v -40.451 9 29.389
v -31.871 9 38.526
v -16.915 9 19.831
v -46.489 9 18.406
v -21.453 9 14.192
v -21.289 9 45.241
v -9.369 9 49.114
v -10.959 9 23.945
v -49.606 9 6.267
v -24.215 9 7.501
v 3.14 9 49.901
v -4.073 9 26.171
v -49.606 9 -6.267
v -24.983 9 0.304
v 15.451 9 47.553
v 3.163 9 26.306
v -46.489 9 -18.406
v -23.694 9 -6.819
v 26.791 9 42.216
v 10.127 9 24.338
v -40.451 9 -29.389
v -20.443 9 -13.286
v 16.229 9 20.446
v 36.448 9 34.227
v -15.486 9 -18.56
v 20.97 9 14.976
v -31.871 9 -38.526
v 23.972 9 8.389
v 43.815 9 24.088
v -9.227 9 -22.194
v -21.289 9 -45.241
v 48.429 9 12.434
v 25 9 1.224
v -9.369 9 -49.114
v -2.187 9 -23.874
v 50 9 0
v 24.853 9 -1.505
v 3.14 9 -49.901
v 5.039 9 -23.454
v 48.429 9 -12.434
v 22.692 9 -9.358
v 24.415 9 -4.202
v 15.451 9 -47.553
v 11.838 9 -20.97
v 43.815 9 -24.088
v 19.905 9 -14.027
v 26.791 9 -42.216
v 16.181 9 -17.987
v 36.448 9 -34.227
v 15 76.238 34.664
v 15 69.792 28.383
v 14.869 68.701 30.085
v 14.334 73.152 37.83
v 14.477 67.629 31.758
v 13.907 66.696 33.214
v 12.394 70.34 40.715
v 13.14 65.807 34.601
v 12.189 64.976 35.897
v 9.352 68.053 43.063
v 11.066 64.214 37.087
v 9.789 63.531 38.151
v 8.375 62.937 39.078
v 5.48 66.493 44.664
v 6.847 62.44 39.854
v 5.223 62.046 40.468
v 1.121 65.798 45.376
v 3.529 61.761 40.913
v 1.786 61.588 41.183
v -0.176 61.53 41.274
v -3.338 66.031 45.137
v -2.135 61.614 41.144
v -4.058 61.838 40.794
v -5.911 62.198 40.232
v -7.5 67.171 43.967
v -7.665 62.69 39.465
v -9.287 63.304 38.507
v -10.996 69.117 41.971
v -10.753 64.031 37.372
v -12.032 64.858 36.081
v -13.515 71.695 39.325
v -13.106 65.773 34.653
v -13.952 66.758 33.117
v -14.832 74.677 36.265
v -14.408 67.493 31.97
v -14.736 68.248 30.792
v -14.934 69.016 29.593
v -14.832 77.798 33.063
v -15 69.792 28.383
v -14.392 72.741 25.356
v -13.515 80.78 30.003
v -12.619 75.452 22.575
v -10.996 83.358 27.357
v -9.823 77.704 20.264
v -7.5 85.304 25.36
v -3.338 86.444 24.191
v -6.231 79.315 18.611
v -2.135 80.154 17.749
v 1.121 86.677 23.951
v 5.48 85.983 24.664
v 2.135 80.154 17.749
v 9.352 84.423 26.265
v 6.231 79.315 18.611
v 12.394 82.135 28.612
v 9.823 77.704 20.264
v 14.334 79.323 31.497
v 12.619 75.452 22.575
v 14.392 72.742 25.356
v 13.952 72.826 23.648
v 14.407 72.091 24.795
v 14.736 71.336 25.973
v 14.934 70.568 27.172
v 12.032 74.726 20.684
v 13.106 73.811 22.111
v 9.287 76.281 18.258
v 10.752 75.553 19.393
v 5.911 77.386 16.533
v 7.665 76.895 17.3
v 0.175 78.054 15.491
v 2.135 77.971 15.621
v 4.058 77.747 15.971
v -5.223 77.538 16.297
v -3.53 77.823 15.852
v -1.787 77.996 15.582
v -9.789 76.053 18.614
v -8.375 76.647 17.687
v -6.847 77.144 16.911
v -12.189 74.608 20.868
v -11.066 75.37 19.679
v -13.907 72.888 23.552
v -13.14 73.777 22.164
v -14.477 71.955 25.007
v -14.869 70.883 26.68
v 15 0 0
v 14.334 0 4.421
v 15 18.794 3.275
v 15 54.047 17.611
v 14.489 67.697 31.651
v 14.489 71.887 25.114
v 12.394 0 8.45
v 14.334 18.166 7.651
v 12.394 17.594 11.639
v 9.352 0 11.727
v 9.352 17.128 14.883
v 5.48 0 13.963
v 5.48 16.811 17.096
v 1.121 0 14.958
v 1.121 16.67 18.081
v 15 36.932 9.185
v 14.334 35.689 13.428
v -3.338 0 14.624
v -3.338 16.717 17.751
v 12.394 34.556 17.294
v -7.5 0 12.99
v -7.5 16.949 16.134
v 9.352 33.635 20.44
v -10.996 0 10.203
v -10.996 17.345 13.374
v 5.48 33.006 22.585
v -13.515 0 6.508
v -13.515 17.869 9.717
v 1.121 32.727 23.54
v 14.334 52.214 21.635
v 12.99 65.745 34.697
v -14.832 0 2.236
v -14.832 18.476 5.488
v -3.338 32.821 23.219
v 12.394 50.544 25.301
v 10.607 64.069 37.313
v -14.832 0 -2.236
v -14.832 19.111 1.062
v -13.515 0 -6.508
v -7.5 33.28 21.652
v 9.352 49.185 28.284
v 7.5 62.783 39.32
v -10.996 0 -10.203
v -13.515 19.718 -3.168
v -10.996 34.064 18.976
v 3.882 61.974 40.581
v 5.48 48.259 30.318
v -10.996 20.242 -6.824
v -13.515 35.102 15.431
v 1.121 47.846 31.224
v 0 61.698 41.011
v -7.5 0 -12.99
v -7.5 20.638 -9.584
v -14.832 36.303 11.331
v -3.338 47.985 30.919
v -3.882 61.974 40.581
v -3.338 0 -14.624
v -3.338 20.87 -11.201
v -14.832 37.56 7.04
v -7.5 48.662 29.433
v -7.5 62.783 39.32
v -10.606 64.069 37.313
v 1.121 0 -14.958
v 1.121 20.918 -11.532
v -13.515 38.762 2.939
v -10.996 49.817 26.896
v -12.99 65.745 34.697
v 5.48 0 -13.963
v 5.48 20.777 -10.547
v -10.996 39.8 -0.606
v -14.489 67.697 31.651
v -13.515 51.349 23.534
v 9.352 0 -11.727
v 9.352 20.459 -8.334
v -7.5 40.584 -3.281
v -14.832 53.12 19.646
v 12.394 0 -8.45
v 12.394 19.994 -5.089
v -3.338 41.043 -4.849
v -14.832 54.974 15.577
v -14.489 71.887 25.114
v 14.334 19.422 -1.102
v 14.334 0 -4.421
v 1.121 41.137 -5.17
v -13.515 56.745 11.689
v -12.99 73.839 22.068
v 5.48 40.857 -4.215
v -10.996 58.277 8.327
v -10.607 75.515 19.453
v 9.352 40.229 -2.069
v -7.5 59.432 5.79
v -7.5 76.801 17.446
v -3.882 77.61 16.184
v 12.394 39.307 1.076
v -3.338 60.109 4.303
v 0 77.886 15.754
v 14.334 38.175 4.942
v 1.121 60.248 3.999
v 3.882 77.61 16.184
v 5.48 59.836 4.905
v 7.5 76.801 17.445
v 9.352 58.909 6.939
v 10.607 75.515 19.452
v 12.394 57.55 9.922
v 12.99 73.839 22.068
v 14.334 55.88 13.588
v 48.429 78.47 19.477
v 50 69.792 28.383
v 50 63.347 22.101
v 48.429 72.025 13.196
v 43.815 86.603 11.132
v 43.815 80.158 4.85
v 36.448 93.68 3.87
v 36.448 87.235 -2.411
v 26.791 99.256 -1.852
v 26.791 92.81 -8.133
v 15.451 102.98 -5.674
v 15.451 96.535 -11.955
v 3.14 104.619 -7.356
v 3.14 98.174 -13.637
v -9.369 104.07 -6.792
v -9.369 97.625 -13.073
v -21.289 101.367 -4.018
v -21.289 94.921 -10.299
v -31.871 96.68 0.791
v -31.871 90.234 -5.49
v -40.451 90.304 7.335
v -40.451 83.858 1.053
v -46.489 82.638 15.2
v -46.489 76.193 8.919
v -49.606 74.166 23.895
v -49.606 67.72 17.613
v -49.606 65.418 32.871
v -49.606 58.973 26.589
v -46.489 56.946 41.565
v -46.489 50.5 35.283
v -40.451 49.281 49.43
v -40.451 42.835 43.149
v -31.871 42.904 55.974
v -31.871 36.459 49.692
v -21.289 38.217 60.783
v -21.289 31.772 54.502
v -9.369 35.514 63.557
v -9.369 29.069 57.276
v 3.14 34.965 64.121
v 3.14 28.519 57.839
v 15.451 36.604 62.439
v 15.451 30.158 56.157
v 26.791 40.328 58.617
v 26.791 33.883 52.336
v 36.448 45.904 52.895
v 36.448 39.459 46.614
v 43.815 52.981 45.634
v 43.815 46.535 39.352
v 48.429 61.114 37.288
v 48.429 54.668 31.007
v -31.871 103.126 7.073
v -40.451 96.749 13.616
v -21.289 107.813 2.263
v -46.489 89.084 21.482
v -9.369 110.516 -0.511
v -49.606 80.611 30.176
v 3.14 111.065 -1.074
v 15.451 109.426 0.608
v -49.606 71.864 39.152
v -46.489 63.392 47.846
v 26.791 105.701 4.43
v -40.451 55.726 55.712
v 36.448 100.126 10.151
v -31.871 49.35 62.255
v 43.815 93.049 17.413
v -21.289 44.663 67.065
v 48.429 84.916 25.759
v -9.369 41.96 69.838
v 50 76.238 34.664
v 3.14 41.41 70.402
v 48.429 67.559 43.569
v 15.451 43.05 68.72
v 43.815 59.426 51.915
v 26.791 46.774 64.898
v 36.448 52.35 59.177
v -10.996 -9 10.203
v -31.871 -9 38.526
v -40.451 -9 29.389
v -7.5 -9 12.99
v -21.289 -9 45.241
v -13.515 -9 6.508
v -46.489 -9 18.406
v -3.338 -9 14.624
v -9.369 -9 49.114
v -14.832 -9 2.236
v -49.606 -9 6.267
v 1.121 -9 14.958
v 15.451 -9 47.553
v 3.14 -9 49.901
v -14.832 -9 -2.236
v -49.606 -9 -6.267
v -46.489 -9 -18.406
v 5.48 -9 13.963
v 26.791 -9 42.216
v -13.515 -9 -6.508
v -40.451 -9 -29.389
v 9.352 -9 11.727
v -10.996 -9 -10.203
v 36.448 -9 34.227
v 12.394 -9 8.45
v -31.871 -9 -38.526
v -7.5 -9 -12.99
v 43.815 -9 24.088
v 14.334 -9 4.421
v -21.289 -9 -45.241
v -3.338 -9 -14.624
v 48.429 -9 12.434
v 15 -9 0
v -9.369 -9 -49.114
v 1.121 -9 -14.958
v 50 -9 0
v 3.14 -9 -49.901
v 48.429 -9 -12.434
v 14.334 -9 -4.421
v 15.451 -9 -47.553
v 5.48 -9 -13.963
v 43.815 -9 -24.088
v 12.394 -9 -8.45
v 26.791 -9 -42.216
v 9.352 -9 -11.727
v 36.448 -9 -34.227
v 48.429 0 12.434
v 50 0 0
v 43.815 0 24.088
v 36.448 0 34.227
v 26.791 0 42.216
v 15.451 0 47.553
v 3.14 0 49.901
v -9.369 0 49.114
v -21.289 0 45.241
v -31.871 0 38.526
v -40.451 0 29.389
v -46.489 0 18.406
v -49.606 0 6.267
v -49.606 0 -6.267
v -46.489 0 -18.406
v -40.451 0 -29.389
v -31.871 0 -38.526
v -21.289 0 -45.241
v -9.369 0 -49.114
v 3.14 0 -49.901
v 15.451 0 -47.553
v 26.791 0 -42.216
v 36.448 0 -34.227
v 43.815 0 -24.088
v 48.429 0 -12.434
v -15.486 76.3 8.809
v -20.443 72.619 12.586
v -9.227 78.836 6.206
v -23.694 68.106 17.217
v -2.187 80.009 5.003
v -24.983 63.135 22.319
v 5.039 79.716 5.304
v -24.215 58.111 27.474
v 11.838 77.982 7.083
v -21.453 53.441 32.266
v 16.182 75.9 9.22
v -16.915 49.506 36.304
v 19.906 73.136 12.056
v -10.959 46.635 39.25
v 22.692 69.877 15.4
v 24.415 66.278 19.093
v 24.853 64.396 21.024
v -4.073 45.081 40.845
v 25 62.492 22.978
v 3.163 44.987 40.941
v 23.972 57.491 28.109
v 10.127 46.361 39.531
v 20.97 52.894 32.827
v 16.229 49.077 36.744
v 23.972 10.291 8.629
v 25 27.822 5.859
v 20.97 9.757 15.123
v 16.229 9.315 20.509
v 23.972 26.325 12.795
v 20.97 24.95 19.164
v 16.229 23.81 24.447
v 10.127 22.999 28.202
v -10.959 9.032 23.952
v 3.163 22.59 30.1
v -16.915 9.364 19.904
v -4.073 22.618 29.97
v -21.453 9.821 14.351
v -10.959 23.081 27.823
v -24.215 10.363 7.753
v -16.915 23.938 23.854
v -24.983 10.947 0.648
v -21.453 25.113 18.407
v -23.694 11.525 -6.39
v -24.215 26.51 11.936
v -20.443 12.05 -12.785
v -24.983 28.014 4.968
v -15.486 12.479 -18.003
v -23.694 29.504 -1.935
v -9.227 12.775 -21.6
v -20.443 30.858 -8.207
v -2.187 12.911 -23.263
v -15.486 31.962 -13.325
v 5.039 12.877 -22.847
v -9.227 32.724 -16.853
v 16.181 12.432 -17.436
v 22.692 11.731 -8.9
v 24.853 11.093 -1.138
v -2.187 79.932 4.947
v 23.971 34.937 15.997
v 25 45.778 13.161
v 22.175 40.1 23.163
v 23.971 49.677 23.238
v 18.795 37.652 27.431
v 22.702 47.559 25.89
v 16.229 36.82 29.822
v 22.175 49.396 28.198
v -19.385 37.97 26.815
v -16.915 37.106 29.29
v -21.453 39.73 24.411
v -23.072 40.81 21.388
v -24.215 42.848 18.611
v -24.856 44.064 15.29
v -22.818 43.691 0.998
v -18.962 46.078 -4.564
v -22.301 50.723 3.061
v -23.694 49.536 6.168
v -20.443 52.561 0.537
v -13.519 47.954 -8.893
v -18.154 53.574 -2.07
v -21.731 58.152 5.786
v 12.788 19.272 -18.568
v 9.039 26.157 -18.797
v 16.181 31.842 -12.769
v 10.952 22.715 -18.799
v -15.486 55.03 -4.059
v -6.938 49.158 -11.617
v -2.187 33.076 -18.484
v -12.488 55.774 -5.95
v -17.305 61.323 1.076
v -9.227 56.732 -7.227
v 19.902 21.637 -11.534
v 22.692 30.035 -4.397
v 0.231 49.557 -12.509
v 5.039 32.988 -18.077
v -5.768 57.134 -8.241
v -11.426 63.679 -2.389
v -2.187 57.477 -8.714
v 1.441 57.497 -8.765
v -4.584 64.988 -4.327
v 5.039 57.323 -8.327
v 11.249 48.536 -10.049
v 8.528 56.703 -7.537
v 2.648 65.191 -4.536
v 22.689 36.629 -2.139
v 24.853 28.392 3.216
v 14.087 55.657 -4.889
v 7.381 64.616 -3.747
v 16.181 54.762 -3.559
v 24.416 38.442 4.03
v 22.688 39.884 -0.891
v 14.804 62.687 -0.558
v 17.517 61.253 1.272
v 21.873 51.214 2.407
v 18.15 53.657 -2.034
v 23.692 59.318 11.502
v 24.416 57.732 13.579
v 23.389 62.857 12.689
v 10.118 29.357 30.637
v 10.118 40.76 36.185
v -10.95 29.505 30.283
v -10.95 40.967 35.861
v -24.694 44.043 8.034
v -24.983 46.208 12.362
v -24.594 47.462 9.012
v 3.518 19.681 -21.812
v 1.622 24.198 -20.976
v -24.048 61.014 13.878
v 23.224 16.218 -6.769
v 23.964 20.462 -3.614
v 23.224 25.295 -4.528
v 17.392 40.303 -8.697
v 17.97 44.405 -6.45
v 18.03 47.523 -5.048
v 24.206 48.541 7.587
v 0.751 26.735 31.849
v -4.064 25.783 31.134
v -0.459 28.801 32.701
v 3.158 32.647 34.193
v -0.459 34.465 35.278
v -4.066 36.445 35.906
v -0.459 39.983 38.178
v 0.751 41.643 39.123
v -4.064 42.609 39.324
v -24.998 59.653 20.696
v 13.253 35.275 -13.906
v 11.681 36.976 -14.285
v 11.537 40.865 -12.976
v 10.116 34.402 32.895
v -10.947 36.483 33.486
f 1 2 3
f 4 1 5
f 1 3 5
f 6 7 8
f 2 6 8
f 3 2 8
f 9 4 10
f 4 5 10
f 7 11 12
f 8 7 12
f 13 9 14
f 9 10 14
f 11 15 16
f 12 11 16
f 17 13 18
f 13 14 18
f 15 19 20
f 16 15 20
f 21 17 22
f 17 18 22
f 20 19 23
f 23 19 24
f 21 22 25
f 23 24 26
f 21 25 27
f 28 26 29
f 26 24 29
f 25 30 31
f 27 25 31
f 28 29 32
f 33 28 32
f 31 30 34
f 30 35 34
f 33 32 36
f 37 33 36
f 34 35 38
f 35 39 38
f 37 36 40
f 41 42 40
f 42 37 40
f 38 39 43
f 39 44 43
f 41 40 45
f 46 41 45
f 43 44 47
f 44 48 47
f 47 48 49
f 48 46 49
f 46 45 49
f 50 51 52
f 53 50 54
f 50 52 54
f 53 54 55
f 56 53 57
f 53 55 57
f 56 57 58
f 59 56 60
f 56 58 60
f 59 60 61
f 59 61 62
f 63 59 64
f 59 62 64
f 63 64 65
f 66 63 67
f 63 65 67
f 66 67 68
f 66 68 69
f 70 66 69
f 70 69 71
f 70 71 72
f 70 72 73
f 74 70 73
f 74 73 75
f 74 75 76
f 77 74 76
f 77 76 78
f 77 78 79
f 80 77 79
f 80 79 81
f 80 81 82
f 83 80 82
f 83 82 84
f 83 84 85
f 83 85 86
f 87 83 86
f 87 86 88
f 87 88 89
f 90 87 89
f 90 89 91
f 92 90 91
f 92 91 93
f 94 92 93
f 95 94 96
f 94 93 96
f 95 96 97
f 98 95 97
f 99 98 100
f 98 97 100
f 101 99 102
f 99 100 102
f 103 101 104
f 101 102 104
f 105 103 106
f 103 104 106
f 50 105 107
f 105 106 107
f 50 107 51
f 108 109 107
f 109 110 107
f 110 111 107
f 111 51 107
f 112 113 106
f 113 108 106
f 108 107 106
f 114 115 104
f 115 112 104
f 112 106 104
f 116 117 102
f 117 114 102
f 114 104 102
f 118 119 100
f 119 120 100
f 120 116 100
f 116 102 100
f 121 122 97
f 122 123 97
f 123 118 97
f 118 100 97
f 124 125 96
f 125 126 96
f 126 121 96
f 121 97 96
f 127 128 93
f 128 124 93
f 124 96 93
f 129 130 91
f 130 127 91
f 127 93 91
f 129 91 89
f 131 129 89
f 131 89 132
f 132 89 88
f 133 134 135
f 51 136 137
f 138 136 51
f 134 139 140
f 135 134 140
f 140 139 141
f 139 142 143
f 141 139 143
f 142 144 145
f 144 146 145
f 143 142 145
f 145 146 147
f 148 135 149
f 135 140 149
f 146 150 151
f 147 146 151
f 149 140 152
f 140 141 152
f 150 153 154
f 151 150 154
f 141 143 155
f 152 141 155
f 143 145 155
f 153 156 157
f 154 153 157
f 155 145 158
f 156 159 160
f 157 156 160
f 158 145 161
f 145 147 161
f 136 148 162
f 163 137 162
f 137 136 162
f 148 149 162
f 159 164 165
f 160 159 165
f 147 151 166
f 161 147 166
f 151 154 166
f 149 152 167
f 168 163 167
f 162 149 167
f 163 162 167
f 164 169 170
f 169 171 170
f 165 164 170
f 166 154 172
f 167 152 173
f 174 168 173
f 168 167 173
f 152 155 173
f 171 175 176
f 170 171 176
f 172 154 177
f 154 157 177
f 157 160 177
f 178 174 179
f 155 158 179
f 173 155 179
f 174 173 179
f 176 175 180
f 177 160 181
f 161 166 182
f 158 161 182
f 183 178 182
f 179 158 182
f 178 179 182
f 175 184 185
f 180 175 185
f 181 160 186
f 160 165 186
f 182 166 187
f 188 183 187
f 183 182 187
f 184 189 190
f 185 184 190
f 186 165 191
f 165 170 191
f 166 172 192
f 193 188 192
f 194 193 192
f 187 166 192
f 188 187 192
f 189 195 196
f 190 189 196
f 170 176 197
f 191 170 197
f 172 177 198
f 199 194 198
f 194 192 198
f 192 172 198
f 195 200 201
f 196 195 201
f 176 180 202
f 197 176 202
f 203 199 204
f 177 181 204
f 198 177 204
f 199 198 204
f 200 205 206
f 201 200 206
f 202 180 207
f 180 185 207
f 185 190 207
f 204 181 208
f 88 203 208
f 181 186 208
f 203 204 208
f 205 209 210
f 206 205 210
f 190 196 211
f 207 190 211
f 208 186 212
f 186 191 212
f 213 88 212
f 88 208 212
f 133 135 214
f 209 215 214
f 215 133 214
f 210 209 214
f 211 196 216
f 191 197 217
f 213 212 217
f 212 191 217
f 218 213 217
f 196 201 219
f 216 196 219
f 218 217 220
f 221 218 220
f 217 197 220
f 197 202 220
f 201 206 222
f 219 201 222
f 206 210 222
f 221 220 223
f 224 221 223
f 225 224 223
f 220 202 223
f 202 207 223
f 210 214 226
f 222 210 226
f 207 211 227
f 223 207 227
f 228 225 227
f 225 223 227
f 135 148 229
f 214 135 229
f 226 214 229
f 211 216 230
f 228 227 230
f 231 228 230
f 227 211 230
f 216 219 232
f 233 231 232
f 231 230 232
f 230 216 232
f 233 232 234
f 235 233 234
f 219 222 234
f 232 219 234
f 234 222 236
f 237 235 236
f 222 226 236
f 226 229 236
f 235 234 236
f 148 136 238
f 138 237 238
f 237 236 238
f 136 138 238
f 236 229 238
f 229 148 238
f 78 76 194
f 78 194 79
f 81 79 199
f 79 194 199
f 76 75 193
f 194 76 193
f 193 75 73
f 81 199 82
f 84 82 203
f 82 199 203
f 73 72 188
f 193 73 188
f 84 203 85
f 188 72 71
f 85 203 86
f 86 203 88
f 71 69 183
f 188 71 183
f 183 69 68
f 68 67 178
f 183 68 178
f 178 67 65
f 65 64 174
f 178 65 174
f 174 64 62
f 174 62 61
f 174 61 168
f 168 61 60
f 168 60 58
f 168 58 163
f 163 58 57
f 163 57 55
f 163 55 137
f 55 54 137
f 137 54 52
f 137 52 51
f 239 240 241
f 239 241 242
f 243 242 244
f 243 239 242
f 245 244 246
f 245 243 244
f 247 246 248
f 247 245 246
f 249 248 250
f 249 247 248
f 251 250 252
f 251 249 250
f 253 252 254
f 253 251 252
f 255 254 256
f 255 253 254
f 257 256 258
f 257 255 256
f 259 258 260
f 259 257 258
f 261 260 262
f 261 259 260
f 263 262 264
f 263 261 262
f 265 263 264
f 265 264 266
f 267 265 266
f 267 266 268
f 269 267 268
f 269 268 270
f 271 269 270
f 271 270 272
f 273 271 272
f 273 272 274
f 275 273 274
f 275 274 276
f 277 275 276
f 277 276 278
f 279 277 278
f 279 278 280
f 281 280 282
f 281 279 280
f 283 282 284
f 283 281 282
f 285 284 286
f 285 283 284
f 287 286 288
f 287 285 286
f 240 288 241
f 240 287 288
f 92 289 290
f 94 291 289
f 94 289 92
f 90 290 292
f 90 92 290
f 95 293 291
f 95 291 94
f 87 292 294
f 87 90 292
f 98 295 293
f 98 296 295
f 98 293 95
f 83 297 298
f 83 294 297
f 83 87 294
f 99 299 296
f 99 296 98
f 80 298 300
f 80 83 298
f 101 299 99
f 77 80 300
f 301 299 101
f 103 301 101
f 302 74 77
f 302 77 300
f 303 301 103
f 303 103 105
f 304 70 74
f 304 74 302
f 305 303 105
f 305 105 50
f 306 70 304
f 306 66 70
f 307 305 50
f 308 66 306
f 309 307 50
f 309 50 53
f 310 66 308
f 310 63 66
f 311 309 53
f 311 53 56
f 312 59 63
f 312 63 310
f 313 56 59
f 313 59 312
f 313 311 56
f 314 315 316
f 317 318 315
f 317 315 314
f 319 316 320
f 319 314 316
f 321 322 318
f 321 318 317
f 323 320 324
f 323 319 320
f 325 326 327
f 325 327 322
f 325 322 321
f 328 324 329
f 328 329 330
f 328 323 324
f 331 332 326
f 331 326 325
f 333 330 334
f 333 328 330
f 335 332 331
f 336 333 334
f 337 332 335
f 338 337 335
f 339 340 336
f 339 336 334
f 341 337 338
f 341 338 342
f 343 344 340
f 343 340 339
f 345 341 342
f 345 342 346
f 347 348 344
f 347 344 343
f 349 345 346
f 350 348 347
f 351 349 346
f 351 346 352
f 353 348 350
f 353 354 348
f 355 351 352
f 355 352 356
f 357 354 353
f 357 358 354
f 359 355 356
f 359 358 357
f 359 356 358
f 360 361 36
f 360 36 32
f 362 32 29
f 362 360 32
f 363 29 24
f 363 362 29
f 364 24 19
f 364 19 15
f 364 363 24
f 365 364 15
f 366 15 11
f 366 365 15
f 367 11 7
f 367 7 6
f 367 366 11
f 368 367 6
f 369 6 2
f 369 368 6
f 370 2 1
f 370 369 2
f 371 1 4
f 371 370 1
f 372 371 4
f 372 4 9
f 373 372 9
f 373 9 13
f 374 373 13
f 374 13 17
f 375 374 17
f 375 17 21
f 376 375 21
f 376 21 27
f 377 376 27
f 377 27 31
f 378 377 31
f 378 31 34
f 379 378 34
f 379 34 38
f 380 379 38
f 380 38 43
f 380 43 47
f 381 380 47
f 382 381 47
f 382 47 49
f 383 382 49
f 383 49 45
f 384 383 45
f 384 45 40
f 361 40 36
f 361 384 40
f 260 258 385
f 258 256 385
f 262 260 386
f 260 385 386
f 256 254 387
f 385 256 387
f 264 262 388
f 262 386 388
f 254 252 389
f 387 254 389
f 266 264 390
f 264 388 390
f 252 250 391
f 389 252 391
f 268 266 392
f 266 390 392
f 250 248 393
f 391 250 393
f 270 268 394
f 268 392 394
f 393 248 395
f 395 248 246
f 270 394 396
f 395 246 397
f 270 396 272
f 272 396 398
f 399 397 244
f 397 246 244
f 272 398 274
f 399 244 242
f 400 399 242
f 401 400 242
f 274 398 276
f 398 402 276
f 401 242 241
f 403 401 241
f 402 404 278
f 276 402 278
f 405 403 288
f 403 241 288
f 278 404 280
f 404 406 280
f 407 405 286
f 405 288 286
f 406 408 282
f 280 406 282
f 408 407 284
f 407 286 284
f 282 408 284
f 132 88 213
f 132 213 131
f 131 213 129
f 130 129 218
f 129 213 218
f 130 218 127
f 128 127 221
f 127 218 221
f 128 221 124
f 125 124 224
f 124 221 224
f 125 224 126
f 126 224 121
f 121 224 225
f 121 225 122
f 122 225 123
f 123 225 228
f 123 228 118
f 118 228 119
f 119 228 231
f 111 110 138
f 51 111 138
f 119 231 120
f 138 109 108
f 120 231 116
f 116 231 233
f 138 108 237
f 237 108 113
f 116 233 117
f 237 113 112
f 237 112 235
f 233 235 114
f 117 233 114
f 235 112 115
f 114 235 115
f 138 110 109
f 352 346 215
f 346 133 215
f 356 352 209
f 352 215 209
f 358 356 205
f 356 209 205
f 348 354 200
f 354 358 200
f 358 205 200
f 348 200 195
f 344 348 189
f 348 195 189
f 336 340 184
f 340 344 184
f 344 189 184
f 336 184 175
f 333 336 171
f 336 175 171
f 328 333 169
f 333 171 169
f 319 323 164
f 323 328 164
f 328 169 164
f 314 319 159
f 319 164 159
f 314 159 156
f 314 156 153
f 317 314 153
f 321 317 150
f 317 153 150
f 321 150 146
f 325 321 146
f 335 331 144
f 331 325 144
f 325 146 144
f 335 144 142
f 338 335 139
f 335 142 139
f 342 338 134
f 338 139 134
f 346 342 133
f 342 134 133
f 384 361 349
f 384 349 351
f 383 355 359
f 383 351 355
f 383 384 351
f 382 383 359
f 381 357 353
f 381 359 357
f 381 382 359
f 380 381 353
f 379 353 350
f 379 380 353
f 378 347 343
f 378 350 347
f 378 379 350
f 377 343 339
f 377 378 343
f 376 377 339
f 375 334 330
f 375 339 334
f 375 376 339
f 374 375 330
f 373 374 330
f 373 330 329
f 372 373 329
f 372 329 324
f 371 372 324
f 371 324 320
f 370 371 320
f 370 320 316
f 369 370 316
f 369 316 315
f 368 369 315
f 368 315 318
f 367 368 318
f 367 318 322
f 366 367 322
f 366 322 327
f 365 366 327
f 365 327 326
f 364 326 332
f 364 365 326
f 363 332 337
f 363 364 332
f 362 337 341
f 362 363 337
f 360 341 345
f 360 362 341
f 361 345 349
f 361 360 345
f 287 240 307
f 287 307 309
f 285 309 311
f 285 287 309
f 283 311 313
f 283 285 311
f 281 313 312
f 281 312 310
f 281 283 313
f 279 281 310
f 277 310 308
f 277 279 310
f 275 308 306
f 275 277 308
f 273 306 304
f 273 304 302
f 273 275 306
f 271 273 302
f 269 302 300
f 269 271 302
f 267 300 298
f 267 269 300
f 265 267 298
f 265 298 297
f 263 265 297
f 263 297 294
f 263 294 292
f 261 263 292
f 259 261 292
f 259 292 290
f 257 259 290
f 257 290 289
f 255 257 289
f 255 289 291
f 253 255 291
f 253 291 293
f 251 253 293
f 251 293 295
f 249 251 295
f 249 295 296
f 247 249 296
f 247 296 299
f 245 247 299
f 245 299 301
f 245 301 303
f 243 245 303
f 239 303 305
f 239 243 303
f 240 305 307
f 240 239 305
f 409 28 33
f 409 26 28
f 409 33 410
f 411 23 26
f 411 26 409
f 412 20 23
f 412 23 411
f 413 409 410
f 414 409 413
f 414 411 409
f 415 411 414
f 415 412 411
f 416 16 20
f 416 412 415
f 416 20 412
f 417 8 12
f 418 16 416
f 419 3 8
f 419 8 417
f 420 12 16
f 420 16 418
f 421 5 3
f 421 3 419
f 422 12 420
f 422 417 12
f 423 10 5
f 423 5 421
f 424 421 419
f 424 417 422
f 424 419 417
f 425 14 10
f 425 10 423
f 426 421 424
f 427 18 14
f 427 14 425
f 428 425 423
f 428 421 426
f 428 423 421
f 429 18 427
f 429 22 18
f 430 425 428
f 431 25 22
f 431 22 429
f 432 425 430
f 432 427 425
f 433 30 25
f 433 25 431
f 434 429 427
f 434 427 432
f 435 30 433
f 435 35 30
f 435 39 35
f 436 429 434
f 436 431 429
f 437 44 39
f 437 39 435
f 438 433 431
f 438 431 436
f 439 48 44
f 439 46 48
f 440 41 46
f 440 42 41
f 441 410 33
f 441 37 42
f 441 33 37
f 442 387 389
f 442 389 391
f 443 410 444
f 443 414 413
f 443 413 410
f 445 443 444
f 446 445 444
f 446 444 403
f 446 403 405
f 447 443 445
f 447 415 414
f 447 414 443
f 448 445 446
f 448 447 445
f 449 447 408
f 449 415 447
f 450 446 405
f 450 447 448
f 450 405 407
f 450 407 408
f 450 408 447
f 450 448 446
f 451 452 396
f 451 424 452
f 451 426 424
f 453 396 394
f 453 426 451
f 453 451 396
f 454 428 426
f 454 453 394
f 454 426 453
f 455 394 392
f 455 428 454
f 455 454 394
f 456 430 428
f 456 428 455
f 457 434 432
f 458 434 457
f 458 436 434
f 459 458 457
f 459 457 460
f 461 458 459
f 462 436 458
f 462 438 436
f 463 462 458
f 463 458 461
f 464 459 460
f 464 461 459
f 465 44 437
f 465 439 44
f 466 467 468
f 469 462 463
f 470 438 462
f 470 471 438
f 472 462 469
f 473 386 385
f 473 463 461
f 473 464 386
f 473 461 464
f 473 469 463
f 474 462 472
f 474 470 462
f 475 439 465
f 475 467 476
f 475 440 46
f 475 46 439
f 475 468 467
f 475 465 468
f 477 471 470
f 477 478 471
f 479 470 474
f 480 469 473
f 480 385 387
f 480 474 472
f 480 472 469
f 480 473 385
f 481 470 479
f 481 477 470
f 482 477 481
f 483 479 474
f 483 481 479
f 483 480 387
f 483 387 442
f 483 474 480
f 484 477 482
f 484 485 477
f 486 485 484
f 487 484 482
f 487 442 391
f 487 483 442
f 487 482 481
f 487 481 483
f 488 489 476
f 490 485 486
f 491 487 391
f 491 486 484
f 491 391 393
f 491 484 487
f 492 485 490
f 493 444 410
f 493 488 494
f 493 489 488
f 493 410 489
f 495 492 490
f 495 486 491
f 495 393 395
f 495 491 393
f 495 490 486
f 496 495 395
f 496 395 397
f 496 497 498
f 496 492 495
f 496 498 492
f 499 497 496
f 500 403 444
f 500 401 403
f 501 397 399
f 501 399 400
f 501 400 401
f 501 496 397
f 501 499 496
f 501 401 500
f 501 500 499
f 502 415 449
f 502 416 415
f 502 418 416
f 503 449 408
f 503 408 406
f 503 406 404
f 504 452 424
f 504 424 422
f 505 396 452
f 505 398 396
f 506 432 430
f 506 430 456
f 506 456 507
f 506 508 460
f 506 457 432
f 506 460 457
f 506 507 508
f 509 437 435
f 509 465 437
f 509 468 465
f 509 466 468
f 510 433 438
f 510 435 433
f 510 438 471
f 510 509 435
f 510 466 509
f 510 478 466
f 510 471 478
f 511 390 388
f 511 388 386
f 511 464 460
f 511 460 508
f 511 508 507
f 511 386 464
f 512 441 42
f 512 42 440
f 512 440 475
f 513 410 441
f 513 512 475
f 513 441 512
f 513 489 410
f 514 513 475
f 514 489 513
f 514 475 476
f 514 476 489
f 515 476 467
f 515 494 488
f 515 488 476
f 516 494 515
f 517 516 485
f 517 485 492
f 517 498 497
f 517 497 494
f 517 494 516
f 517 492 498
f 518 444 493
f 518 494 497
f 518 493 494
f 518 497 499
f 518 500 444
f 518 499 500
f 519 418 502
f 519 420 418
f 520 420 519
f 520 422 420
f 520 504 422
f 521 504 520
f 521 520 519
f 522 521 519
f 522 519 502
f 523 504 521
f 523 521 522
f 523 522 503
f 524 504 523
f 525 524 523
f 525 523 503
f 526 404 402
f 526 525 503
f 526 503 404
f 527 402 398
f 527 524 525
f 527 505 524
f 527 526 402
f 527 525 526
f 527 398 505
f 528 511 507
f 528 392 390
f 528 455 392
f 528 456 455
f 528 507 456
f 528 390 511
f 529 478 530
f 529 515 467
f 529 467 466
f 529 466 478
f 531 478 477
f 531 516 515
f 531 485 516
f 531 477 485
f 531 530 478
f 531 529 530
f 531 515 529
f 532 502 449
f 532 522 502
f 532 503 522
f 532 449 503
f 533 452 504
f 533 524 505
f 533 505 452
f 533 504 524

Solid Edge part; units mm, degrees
sketch "Sketch1" plane through (0, 0, 0) normal (1, 0, 0) x (0, 1, 0)
  arc A0 (0, 0) -> (69.7921, 28.3825) centre (-13.5476, 133.3134) ccw
sketch "Sketch2" plane through (0, 0, 0) normal (0, -1, 0) x (1, 0, 0)
  circle A0 centre (0, 0) radius 25
sweep "SweptProtrusion_2" add profiles "Sketch2" path "Sketch1"
sketch "Sketch3" plane through (0, 0, 0) normal (0, -1, 0) x (1, 0, 0)
  circle A0 centre (0, 0) radius 50
  circle A1 centre (0, 0) radius 15
extrude "ExtrudedProtrusion_6" add sketch "Sketch3" along normal blind 9
sketch "Sketch4" plane through (0, 0, 0) normal (0, -1, 0) x (1, 0, 0)
  circle A0 centre (0, 0) radius 50
  circle A1 centre (0, 0) radius 15
extrude "ExtrudedProtrusion_7" add sketch "Sketch4" against normal blind 9
mirror "Mirror1" about plane through (0, 36.9319, 9.1852) normal (0, 0.92633, 0.3767131) of "ExtrudedProtrusion_7"
mirror "Mirror2" about plane through (0, 36.9319, 9.1852) normal (0, 0.92633, 0.3767131) of "ExtrudedProtrusion_6"
sketch "Sketch5" plane through (0, 0, 0) normal (1, 0, 0) x (0, 1, 0)
  arc A0 (0, 0) -> (69.7921, 28.3825) centre (-13.5476, 133.3134) ccw
sketch "Sketch6" plane through (0, 0, 0) normal (0, -1, 0) x (1, 0, 0)
  circle A0 centre (0, 0) radius 15
sweep "SweptCutout_4" cut profiles "Sketch6" path "Sketch5"
